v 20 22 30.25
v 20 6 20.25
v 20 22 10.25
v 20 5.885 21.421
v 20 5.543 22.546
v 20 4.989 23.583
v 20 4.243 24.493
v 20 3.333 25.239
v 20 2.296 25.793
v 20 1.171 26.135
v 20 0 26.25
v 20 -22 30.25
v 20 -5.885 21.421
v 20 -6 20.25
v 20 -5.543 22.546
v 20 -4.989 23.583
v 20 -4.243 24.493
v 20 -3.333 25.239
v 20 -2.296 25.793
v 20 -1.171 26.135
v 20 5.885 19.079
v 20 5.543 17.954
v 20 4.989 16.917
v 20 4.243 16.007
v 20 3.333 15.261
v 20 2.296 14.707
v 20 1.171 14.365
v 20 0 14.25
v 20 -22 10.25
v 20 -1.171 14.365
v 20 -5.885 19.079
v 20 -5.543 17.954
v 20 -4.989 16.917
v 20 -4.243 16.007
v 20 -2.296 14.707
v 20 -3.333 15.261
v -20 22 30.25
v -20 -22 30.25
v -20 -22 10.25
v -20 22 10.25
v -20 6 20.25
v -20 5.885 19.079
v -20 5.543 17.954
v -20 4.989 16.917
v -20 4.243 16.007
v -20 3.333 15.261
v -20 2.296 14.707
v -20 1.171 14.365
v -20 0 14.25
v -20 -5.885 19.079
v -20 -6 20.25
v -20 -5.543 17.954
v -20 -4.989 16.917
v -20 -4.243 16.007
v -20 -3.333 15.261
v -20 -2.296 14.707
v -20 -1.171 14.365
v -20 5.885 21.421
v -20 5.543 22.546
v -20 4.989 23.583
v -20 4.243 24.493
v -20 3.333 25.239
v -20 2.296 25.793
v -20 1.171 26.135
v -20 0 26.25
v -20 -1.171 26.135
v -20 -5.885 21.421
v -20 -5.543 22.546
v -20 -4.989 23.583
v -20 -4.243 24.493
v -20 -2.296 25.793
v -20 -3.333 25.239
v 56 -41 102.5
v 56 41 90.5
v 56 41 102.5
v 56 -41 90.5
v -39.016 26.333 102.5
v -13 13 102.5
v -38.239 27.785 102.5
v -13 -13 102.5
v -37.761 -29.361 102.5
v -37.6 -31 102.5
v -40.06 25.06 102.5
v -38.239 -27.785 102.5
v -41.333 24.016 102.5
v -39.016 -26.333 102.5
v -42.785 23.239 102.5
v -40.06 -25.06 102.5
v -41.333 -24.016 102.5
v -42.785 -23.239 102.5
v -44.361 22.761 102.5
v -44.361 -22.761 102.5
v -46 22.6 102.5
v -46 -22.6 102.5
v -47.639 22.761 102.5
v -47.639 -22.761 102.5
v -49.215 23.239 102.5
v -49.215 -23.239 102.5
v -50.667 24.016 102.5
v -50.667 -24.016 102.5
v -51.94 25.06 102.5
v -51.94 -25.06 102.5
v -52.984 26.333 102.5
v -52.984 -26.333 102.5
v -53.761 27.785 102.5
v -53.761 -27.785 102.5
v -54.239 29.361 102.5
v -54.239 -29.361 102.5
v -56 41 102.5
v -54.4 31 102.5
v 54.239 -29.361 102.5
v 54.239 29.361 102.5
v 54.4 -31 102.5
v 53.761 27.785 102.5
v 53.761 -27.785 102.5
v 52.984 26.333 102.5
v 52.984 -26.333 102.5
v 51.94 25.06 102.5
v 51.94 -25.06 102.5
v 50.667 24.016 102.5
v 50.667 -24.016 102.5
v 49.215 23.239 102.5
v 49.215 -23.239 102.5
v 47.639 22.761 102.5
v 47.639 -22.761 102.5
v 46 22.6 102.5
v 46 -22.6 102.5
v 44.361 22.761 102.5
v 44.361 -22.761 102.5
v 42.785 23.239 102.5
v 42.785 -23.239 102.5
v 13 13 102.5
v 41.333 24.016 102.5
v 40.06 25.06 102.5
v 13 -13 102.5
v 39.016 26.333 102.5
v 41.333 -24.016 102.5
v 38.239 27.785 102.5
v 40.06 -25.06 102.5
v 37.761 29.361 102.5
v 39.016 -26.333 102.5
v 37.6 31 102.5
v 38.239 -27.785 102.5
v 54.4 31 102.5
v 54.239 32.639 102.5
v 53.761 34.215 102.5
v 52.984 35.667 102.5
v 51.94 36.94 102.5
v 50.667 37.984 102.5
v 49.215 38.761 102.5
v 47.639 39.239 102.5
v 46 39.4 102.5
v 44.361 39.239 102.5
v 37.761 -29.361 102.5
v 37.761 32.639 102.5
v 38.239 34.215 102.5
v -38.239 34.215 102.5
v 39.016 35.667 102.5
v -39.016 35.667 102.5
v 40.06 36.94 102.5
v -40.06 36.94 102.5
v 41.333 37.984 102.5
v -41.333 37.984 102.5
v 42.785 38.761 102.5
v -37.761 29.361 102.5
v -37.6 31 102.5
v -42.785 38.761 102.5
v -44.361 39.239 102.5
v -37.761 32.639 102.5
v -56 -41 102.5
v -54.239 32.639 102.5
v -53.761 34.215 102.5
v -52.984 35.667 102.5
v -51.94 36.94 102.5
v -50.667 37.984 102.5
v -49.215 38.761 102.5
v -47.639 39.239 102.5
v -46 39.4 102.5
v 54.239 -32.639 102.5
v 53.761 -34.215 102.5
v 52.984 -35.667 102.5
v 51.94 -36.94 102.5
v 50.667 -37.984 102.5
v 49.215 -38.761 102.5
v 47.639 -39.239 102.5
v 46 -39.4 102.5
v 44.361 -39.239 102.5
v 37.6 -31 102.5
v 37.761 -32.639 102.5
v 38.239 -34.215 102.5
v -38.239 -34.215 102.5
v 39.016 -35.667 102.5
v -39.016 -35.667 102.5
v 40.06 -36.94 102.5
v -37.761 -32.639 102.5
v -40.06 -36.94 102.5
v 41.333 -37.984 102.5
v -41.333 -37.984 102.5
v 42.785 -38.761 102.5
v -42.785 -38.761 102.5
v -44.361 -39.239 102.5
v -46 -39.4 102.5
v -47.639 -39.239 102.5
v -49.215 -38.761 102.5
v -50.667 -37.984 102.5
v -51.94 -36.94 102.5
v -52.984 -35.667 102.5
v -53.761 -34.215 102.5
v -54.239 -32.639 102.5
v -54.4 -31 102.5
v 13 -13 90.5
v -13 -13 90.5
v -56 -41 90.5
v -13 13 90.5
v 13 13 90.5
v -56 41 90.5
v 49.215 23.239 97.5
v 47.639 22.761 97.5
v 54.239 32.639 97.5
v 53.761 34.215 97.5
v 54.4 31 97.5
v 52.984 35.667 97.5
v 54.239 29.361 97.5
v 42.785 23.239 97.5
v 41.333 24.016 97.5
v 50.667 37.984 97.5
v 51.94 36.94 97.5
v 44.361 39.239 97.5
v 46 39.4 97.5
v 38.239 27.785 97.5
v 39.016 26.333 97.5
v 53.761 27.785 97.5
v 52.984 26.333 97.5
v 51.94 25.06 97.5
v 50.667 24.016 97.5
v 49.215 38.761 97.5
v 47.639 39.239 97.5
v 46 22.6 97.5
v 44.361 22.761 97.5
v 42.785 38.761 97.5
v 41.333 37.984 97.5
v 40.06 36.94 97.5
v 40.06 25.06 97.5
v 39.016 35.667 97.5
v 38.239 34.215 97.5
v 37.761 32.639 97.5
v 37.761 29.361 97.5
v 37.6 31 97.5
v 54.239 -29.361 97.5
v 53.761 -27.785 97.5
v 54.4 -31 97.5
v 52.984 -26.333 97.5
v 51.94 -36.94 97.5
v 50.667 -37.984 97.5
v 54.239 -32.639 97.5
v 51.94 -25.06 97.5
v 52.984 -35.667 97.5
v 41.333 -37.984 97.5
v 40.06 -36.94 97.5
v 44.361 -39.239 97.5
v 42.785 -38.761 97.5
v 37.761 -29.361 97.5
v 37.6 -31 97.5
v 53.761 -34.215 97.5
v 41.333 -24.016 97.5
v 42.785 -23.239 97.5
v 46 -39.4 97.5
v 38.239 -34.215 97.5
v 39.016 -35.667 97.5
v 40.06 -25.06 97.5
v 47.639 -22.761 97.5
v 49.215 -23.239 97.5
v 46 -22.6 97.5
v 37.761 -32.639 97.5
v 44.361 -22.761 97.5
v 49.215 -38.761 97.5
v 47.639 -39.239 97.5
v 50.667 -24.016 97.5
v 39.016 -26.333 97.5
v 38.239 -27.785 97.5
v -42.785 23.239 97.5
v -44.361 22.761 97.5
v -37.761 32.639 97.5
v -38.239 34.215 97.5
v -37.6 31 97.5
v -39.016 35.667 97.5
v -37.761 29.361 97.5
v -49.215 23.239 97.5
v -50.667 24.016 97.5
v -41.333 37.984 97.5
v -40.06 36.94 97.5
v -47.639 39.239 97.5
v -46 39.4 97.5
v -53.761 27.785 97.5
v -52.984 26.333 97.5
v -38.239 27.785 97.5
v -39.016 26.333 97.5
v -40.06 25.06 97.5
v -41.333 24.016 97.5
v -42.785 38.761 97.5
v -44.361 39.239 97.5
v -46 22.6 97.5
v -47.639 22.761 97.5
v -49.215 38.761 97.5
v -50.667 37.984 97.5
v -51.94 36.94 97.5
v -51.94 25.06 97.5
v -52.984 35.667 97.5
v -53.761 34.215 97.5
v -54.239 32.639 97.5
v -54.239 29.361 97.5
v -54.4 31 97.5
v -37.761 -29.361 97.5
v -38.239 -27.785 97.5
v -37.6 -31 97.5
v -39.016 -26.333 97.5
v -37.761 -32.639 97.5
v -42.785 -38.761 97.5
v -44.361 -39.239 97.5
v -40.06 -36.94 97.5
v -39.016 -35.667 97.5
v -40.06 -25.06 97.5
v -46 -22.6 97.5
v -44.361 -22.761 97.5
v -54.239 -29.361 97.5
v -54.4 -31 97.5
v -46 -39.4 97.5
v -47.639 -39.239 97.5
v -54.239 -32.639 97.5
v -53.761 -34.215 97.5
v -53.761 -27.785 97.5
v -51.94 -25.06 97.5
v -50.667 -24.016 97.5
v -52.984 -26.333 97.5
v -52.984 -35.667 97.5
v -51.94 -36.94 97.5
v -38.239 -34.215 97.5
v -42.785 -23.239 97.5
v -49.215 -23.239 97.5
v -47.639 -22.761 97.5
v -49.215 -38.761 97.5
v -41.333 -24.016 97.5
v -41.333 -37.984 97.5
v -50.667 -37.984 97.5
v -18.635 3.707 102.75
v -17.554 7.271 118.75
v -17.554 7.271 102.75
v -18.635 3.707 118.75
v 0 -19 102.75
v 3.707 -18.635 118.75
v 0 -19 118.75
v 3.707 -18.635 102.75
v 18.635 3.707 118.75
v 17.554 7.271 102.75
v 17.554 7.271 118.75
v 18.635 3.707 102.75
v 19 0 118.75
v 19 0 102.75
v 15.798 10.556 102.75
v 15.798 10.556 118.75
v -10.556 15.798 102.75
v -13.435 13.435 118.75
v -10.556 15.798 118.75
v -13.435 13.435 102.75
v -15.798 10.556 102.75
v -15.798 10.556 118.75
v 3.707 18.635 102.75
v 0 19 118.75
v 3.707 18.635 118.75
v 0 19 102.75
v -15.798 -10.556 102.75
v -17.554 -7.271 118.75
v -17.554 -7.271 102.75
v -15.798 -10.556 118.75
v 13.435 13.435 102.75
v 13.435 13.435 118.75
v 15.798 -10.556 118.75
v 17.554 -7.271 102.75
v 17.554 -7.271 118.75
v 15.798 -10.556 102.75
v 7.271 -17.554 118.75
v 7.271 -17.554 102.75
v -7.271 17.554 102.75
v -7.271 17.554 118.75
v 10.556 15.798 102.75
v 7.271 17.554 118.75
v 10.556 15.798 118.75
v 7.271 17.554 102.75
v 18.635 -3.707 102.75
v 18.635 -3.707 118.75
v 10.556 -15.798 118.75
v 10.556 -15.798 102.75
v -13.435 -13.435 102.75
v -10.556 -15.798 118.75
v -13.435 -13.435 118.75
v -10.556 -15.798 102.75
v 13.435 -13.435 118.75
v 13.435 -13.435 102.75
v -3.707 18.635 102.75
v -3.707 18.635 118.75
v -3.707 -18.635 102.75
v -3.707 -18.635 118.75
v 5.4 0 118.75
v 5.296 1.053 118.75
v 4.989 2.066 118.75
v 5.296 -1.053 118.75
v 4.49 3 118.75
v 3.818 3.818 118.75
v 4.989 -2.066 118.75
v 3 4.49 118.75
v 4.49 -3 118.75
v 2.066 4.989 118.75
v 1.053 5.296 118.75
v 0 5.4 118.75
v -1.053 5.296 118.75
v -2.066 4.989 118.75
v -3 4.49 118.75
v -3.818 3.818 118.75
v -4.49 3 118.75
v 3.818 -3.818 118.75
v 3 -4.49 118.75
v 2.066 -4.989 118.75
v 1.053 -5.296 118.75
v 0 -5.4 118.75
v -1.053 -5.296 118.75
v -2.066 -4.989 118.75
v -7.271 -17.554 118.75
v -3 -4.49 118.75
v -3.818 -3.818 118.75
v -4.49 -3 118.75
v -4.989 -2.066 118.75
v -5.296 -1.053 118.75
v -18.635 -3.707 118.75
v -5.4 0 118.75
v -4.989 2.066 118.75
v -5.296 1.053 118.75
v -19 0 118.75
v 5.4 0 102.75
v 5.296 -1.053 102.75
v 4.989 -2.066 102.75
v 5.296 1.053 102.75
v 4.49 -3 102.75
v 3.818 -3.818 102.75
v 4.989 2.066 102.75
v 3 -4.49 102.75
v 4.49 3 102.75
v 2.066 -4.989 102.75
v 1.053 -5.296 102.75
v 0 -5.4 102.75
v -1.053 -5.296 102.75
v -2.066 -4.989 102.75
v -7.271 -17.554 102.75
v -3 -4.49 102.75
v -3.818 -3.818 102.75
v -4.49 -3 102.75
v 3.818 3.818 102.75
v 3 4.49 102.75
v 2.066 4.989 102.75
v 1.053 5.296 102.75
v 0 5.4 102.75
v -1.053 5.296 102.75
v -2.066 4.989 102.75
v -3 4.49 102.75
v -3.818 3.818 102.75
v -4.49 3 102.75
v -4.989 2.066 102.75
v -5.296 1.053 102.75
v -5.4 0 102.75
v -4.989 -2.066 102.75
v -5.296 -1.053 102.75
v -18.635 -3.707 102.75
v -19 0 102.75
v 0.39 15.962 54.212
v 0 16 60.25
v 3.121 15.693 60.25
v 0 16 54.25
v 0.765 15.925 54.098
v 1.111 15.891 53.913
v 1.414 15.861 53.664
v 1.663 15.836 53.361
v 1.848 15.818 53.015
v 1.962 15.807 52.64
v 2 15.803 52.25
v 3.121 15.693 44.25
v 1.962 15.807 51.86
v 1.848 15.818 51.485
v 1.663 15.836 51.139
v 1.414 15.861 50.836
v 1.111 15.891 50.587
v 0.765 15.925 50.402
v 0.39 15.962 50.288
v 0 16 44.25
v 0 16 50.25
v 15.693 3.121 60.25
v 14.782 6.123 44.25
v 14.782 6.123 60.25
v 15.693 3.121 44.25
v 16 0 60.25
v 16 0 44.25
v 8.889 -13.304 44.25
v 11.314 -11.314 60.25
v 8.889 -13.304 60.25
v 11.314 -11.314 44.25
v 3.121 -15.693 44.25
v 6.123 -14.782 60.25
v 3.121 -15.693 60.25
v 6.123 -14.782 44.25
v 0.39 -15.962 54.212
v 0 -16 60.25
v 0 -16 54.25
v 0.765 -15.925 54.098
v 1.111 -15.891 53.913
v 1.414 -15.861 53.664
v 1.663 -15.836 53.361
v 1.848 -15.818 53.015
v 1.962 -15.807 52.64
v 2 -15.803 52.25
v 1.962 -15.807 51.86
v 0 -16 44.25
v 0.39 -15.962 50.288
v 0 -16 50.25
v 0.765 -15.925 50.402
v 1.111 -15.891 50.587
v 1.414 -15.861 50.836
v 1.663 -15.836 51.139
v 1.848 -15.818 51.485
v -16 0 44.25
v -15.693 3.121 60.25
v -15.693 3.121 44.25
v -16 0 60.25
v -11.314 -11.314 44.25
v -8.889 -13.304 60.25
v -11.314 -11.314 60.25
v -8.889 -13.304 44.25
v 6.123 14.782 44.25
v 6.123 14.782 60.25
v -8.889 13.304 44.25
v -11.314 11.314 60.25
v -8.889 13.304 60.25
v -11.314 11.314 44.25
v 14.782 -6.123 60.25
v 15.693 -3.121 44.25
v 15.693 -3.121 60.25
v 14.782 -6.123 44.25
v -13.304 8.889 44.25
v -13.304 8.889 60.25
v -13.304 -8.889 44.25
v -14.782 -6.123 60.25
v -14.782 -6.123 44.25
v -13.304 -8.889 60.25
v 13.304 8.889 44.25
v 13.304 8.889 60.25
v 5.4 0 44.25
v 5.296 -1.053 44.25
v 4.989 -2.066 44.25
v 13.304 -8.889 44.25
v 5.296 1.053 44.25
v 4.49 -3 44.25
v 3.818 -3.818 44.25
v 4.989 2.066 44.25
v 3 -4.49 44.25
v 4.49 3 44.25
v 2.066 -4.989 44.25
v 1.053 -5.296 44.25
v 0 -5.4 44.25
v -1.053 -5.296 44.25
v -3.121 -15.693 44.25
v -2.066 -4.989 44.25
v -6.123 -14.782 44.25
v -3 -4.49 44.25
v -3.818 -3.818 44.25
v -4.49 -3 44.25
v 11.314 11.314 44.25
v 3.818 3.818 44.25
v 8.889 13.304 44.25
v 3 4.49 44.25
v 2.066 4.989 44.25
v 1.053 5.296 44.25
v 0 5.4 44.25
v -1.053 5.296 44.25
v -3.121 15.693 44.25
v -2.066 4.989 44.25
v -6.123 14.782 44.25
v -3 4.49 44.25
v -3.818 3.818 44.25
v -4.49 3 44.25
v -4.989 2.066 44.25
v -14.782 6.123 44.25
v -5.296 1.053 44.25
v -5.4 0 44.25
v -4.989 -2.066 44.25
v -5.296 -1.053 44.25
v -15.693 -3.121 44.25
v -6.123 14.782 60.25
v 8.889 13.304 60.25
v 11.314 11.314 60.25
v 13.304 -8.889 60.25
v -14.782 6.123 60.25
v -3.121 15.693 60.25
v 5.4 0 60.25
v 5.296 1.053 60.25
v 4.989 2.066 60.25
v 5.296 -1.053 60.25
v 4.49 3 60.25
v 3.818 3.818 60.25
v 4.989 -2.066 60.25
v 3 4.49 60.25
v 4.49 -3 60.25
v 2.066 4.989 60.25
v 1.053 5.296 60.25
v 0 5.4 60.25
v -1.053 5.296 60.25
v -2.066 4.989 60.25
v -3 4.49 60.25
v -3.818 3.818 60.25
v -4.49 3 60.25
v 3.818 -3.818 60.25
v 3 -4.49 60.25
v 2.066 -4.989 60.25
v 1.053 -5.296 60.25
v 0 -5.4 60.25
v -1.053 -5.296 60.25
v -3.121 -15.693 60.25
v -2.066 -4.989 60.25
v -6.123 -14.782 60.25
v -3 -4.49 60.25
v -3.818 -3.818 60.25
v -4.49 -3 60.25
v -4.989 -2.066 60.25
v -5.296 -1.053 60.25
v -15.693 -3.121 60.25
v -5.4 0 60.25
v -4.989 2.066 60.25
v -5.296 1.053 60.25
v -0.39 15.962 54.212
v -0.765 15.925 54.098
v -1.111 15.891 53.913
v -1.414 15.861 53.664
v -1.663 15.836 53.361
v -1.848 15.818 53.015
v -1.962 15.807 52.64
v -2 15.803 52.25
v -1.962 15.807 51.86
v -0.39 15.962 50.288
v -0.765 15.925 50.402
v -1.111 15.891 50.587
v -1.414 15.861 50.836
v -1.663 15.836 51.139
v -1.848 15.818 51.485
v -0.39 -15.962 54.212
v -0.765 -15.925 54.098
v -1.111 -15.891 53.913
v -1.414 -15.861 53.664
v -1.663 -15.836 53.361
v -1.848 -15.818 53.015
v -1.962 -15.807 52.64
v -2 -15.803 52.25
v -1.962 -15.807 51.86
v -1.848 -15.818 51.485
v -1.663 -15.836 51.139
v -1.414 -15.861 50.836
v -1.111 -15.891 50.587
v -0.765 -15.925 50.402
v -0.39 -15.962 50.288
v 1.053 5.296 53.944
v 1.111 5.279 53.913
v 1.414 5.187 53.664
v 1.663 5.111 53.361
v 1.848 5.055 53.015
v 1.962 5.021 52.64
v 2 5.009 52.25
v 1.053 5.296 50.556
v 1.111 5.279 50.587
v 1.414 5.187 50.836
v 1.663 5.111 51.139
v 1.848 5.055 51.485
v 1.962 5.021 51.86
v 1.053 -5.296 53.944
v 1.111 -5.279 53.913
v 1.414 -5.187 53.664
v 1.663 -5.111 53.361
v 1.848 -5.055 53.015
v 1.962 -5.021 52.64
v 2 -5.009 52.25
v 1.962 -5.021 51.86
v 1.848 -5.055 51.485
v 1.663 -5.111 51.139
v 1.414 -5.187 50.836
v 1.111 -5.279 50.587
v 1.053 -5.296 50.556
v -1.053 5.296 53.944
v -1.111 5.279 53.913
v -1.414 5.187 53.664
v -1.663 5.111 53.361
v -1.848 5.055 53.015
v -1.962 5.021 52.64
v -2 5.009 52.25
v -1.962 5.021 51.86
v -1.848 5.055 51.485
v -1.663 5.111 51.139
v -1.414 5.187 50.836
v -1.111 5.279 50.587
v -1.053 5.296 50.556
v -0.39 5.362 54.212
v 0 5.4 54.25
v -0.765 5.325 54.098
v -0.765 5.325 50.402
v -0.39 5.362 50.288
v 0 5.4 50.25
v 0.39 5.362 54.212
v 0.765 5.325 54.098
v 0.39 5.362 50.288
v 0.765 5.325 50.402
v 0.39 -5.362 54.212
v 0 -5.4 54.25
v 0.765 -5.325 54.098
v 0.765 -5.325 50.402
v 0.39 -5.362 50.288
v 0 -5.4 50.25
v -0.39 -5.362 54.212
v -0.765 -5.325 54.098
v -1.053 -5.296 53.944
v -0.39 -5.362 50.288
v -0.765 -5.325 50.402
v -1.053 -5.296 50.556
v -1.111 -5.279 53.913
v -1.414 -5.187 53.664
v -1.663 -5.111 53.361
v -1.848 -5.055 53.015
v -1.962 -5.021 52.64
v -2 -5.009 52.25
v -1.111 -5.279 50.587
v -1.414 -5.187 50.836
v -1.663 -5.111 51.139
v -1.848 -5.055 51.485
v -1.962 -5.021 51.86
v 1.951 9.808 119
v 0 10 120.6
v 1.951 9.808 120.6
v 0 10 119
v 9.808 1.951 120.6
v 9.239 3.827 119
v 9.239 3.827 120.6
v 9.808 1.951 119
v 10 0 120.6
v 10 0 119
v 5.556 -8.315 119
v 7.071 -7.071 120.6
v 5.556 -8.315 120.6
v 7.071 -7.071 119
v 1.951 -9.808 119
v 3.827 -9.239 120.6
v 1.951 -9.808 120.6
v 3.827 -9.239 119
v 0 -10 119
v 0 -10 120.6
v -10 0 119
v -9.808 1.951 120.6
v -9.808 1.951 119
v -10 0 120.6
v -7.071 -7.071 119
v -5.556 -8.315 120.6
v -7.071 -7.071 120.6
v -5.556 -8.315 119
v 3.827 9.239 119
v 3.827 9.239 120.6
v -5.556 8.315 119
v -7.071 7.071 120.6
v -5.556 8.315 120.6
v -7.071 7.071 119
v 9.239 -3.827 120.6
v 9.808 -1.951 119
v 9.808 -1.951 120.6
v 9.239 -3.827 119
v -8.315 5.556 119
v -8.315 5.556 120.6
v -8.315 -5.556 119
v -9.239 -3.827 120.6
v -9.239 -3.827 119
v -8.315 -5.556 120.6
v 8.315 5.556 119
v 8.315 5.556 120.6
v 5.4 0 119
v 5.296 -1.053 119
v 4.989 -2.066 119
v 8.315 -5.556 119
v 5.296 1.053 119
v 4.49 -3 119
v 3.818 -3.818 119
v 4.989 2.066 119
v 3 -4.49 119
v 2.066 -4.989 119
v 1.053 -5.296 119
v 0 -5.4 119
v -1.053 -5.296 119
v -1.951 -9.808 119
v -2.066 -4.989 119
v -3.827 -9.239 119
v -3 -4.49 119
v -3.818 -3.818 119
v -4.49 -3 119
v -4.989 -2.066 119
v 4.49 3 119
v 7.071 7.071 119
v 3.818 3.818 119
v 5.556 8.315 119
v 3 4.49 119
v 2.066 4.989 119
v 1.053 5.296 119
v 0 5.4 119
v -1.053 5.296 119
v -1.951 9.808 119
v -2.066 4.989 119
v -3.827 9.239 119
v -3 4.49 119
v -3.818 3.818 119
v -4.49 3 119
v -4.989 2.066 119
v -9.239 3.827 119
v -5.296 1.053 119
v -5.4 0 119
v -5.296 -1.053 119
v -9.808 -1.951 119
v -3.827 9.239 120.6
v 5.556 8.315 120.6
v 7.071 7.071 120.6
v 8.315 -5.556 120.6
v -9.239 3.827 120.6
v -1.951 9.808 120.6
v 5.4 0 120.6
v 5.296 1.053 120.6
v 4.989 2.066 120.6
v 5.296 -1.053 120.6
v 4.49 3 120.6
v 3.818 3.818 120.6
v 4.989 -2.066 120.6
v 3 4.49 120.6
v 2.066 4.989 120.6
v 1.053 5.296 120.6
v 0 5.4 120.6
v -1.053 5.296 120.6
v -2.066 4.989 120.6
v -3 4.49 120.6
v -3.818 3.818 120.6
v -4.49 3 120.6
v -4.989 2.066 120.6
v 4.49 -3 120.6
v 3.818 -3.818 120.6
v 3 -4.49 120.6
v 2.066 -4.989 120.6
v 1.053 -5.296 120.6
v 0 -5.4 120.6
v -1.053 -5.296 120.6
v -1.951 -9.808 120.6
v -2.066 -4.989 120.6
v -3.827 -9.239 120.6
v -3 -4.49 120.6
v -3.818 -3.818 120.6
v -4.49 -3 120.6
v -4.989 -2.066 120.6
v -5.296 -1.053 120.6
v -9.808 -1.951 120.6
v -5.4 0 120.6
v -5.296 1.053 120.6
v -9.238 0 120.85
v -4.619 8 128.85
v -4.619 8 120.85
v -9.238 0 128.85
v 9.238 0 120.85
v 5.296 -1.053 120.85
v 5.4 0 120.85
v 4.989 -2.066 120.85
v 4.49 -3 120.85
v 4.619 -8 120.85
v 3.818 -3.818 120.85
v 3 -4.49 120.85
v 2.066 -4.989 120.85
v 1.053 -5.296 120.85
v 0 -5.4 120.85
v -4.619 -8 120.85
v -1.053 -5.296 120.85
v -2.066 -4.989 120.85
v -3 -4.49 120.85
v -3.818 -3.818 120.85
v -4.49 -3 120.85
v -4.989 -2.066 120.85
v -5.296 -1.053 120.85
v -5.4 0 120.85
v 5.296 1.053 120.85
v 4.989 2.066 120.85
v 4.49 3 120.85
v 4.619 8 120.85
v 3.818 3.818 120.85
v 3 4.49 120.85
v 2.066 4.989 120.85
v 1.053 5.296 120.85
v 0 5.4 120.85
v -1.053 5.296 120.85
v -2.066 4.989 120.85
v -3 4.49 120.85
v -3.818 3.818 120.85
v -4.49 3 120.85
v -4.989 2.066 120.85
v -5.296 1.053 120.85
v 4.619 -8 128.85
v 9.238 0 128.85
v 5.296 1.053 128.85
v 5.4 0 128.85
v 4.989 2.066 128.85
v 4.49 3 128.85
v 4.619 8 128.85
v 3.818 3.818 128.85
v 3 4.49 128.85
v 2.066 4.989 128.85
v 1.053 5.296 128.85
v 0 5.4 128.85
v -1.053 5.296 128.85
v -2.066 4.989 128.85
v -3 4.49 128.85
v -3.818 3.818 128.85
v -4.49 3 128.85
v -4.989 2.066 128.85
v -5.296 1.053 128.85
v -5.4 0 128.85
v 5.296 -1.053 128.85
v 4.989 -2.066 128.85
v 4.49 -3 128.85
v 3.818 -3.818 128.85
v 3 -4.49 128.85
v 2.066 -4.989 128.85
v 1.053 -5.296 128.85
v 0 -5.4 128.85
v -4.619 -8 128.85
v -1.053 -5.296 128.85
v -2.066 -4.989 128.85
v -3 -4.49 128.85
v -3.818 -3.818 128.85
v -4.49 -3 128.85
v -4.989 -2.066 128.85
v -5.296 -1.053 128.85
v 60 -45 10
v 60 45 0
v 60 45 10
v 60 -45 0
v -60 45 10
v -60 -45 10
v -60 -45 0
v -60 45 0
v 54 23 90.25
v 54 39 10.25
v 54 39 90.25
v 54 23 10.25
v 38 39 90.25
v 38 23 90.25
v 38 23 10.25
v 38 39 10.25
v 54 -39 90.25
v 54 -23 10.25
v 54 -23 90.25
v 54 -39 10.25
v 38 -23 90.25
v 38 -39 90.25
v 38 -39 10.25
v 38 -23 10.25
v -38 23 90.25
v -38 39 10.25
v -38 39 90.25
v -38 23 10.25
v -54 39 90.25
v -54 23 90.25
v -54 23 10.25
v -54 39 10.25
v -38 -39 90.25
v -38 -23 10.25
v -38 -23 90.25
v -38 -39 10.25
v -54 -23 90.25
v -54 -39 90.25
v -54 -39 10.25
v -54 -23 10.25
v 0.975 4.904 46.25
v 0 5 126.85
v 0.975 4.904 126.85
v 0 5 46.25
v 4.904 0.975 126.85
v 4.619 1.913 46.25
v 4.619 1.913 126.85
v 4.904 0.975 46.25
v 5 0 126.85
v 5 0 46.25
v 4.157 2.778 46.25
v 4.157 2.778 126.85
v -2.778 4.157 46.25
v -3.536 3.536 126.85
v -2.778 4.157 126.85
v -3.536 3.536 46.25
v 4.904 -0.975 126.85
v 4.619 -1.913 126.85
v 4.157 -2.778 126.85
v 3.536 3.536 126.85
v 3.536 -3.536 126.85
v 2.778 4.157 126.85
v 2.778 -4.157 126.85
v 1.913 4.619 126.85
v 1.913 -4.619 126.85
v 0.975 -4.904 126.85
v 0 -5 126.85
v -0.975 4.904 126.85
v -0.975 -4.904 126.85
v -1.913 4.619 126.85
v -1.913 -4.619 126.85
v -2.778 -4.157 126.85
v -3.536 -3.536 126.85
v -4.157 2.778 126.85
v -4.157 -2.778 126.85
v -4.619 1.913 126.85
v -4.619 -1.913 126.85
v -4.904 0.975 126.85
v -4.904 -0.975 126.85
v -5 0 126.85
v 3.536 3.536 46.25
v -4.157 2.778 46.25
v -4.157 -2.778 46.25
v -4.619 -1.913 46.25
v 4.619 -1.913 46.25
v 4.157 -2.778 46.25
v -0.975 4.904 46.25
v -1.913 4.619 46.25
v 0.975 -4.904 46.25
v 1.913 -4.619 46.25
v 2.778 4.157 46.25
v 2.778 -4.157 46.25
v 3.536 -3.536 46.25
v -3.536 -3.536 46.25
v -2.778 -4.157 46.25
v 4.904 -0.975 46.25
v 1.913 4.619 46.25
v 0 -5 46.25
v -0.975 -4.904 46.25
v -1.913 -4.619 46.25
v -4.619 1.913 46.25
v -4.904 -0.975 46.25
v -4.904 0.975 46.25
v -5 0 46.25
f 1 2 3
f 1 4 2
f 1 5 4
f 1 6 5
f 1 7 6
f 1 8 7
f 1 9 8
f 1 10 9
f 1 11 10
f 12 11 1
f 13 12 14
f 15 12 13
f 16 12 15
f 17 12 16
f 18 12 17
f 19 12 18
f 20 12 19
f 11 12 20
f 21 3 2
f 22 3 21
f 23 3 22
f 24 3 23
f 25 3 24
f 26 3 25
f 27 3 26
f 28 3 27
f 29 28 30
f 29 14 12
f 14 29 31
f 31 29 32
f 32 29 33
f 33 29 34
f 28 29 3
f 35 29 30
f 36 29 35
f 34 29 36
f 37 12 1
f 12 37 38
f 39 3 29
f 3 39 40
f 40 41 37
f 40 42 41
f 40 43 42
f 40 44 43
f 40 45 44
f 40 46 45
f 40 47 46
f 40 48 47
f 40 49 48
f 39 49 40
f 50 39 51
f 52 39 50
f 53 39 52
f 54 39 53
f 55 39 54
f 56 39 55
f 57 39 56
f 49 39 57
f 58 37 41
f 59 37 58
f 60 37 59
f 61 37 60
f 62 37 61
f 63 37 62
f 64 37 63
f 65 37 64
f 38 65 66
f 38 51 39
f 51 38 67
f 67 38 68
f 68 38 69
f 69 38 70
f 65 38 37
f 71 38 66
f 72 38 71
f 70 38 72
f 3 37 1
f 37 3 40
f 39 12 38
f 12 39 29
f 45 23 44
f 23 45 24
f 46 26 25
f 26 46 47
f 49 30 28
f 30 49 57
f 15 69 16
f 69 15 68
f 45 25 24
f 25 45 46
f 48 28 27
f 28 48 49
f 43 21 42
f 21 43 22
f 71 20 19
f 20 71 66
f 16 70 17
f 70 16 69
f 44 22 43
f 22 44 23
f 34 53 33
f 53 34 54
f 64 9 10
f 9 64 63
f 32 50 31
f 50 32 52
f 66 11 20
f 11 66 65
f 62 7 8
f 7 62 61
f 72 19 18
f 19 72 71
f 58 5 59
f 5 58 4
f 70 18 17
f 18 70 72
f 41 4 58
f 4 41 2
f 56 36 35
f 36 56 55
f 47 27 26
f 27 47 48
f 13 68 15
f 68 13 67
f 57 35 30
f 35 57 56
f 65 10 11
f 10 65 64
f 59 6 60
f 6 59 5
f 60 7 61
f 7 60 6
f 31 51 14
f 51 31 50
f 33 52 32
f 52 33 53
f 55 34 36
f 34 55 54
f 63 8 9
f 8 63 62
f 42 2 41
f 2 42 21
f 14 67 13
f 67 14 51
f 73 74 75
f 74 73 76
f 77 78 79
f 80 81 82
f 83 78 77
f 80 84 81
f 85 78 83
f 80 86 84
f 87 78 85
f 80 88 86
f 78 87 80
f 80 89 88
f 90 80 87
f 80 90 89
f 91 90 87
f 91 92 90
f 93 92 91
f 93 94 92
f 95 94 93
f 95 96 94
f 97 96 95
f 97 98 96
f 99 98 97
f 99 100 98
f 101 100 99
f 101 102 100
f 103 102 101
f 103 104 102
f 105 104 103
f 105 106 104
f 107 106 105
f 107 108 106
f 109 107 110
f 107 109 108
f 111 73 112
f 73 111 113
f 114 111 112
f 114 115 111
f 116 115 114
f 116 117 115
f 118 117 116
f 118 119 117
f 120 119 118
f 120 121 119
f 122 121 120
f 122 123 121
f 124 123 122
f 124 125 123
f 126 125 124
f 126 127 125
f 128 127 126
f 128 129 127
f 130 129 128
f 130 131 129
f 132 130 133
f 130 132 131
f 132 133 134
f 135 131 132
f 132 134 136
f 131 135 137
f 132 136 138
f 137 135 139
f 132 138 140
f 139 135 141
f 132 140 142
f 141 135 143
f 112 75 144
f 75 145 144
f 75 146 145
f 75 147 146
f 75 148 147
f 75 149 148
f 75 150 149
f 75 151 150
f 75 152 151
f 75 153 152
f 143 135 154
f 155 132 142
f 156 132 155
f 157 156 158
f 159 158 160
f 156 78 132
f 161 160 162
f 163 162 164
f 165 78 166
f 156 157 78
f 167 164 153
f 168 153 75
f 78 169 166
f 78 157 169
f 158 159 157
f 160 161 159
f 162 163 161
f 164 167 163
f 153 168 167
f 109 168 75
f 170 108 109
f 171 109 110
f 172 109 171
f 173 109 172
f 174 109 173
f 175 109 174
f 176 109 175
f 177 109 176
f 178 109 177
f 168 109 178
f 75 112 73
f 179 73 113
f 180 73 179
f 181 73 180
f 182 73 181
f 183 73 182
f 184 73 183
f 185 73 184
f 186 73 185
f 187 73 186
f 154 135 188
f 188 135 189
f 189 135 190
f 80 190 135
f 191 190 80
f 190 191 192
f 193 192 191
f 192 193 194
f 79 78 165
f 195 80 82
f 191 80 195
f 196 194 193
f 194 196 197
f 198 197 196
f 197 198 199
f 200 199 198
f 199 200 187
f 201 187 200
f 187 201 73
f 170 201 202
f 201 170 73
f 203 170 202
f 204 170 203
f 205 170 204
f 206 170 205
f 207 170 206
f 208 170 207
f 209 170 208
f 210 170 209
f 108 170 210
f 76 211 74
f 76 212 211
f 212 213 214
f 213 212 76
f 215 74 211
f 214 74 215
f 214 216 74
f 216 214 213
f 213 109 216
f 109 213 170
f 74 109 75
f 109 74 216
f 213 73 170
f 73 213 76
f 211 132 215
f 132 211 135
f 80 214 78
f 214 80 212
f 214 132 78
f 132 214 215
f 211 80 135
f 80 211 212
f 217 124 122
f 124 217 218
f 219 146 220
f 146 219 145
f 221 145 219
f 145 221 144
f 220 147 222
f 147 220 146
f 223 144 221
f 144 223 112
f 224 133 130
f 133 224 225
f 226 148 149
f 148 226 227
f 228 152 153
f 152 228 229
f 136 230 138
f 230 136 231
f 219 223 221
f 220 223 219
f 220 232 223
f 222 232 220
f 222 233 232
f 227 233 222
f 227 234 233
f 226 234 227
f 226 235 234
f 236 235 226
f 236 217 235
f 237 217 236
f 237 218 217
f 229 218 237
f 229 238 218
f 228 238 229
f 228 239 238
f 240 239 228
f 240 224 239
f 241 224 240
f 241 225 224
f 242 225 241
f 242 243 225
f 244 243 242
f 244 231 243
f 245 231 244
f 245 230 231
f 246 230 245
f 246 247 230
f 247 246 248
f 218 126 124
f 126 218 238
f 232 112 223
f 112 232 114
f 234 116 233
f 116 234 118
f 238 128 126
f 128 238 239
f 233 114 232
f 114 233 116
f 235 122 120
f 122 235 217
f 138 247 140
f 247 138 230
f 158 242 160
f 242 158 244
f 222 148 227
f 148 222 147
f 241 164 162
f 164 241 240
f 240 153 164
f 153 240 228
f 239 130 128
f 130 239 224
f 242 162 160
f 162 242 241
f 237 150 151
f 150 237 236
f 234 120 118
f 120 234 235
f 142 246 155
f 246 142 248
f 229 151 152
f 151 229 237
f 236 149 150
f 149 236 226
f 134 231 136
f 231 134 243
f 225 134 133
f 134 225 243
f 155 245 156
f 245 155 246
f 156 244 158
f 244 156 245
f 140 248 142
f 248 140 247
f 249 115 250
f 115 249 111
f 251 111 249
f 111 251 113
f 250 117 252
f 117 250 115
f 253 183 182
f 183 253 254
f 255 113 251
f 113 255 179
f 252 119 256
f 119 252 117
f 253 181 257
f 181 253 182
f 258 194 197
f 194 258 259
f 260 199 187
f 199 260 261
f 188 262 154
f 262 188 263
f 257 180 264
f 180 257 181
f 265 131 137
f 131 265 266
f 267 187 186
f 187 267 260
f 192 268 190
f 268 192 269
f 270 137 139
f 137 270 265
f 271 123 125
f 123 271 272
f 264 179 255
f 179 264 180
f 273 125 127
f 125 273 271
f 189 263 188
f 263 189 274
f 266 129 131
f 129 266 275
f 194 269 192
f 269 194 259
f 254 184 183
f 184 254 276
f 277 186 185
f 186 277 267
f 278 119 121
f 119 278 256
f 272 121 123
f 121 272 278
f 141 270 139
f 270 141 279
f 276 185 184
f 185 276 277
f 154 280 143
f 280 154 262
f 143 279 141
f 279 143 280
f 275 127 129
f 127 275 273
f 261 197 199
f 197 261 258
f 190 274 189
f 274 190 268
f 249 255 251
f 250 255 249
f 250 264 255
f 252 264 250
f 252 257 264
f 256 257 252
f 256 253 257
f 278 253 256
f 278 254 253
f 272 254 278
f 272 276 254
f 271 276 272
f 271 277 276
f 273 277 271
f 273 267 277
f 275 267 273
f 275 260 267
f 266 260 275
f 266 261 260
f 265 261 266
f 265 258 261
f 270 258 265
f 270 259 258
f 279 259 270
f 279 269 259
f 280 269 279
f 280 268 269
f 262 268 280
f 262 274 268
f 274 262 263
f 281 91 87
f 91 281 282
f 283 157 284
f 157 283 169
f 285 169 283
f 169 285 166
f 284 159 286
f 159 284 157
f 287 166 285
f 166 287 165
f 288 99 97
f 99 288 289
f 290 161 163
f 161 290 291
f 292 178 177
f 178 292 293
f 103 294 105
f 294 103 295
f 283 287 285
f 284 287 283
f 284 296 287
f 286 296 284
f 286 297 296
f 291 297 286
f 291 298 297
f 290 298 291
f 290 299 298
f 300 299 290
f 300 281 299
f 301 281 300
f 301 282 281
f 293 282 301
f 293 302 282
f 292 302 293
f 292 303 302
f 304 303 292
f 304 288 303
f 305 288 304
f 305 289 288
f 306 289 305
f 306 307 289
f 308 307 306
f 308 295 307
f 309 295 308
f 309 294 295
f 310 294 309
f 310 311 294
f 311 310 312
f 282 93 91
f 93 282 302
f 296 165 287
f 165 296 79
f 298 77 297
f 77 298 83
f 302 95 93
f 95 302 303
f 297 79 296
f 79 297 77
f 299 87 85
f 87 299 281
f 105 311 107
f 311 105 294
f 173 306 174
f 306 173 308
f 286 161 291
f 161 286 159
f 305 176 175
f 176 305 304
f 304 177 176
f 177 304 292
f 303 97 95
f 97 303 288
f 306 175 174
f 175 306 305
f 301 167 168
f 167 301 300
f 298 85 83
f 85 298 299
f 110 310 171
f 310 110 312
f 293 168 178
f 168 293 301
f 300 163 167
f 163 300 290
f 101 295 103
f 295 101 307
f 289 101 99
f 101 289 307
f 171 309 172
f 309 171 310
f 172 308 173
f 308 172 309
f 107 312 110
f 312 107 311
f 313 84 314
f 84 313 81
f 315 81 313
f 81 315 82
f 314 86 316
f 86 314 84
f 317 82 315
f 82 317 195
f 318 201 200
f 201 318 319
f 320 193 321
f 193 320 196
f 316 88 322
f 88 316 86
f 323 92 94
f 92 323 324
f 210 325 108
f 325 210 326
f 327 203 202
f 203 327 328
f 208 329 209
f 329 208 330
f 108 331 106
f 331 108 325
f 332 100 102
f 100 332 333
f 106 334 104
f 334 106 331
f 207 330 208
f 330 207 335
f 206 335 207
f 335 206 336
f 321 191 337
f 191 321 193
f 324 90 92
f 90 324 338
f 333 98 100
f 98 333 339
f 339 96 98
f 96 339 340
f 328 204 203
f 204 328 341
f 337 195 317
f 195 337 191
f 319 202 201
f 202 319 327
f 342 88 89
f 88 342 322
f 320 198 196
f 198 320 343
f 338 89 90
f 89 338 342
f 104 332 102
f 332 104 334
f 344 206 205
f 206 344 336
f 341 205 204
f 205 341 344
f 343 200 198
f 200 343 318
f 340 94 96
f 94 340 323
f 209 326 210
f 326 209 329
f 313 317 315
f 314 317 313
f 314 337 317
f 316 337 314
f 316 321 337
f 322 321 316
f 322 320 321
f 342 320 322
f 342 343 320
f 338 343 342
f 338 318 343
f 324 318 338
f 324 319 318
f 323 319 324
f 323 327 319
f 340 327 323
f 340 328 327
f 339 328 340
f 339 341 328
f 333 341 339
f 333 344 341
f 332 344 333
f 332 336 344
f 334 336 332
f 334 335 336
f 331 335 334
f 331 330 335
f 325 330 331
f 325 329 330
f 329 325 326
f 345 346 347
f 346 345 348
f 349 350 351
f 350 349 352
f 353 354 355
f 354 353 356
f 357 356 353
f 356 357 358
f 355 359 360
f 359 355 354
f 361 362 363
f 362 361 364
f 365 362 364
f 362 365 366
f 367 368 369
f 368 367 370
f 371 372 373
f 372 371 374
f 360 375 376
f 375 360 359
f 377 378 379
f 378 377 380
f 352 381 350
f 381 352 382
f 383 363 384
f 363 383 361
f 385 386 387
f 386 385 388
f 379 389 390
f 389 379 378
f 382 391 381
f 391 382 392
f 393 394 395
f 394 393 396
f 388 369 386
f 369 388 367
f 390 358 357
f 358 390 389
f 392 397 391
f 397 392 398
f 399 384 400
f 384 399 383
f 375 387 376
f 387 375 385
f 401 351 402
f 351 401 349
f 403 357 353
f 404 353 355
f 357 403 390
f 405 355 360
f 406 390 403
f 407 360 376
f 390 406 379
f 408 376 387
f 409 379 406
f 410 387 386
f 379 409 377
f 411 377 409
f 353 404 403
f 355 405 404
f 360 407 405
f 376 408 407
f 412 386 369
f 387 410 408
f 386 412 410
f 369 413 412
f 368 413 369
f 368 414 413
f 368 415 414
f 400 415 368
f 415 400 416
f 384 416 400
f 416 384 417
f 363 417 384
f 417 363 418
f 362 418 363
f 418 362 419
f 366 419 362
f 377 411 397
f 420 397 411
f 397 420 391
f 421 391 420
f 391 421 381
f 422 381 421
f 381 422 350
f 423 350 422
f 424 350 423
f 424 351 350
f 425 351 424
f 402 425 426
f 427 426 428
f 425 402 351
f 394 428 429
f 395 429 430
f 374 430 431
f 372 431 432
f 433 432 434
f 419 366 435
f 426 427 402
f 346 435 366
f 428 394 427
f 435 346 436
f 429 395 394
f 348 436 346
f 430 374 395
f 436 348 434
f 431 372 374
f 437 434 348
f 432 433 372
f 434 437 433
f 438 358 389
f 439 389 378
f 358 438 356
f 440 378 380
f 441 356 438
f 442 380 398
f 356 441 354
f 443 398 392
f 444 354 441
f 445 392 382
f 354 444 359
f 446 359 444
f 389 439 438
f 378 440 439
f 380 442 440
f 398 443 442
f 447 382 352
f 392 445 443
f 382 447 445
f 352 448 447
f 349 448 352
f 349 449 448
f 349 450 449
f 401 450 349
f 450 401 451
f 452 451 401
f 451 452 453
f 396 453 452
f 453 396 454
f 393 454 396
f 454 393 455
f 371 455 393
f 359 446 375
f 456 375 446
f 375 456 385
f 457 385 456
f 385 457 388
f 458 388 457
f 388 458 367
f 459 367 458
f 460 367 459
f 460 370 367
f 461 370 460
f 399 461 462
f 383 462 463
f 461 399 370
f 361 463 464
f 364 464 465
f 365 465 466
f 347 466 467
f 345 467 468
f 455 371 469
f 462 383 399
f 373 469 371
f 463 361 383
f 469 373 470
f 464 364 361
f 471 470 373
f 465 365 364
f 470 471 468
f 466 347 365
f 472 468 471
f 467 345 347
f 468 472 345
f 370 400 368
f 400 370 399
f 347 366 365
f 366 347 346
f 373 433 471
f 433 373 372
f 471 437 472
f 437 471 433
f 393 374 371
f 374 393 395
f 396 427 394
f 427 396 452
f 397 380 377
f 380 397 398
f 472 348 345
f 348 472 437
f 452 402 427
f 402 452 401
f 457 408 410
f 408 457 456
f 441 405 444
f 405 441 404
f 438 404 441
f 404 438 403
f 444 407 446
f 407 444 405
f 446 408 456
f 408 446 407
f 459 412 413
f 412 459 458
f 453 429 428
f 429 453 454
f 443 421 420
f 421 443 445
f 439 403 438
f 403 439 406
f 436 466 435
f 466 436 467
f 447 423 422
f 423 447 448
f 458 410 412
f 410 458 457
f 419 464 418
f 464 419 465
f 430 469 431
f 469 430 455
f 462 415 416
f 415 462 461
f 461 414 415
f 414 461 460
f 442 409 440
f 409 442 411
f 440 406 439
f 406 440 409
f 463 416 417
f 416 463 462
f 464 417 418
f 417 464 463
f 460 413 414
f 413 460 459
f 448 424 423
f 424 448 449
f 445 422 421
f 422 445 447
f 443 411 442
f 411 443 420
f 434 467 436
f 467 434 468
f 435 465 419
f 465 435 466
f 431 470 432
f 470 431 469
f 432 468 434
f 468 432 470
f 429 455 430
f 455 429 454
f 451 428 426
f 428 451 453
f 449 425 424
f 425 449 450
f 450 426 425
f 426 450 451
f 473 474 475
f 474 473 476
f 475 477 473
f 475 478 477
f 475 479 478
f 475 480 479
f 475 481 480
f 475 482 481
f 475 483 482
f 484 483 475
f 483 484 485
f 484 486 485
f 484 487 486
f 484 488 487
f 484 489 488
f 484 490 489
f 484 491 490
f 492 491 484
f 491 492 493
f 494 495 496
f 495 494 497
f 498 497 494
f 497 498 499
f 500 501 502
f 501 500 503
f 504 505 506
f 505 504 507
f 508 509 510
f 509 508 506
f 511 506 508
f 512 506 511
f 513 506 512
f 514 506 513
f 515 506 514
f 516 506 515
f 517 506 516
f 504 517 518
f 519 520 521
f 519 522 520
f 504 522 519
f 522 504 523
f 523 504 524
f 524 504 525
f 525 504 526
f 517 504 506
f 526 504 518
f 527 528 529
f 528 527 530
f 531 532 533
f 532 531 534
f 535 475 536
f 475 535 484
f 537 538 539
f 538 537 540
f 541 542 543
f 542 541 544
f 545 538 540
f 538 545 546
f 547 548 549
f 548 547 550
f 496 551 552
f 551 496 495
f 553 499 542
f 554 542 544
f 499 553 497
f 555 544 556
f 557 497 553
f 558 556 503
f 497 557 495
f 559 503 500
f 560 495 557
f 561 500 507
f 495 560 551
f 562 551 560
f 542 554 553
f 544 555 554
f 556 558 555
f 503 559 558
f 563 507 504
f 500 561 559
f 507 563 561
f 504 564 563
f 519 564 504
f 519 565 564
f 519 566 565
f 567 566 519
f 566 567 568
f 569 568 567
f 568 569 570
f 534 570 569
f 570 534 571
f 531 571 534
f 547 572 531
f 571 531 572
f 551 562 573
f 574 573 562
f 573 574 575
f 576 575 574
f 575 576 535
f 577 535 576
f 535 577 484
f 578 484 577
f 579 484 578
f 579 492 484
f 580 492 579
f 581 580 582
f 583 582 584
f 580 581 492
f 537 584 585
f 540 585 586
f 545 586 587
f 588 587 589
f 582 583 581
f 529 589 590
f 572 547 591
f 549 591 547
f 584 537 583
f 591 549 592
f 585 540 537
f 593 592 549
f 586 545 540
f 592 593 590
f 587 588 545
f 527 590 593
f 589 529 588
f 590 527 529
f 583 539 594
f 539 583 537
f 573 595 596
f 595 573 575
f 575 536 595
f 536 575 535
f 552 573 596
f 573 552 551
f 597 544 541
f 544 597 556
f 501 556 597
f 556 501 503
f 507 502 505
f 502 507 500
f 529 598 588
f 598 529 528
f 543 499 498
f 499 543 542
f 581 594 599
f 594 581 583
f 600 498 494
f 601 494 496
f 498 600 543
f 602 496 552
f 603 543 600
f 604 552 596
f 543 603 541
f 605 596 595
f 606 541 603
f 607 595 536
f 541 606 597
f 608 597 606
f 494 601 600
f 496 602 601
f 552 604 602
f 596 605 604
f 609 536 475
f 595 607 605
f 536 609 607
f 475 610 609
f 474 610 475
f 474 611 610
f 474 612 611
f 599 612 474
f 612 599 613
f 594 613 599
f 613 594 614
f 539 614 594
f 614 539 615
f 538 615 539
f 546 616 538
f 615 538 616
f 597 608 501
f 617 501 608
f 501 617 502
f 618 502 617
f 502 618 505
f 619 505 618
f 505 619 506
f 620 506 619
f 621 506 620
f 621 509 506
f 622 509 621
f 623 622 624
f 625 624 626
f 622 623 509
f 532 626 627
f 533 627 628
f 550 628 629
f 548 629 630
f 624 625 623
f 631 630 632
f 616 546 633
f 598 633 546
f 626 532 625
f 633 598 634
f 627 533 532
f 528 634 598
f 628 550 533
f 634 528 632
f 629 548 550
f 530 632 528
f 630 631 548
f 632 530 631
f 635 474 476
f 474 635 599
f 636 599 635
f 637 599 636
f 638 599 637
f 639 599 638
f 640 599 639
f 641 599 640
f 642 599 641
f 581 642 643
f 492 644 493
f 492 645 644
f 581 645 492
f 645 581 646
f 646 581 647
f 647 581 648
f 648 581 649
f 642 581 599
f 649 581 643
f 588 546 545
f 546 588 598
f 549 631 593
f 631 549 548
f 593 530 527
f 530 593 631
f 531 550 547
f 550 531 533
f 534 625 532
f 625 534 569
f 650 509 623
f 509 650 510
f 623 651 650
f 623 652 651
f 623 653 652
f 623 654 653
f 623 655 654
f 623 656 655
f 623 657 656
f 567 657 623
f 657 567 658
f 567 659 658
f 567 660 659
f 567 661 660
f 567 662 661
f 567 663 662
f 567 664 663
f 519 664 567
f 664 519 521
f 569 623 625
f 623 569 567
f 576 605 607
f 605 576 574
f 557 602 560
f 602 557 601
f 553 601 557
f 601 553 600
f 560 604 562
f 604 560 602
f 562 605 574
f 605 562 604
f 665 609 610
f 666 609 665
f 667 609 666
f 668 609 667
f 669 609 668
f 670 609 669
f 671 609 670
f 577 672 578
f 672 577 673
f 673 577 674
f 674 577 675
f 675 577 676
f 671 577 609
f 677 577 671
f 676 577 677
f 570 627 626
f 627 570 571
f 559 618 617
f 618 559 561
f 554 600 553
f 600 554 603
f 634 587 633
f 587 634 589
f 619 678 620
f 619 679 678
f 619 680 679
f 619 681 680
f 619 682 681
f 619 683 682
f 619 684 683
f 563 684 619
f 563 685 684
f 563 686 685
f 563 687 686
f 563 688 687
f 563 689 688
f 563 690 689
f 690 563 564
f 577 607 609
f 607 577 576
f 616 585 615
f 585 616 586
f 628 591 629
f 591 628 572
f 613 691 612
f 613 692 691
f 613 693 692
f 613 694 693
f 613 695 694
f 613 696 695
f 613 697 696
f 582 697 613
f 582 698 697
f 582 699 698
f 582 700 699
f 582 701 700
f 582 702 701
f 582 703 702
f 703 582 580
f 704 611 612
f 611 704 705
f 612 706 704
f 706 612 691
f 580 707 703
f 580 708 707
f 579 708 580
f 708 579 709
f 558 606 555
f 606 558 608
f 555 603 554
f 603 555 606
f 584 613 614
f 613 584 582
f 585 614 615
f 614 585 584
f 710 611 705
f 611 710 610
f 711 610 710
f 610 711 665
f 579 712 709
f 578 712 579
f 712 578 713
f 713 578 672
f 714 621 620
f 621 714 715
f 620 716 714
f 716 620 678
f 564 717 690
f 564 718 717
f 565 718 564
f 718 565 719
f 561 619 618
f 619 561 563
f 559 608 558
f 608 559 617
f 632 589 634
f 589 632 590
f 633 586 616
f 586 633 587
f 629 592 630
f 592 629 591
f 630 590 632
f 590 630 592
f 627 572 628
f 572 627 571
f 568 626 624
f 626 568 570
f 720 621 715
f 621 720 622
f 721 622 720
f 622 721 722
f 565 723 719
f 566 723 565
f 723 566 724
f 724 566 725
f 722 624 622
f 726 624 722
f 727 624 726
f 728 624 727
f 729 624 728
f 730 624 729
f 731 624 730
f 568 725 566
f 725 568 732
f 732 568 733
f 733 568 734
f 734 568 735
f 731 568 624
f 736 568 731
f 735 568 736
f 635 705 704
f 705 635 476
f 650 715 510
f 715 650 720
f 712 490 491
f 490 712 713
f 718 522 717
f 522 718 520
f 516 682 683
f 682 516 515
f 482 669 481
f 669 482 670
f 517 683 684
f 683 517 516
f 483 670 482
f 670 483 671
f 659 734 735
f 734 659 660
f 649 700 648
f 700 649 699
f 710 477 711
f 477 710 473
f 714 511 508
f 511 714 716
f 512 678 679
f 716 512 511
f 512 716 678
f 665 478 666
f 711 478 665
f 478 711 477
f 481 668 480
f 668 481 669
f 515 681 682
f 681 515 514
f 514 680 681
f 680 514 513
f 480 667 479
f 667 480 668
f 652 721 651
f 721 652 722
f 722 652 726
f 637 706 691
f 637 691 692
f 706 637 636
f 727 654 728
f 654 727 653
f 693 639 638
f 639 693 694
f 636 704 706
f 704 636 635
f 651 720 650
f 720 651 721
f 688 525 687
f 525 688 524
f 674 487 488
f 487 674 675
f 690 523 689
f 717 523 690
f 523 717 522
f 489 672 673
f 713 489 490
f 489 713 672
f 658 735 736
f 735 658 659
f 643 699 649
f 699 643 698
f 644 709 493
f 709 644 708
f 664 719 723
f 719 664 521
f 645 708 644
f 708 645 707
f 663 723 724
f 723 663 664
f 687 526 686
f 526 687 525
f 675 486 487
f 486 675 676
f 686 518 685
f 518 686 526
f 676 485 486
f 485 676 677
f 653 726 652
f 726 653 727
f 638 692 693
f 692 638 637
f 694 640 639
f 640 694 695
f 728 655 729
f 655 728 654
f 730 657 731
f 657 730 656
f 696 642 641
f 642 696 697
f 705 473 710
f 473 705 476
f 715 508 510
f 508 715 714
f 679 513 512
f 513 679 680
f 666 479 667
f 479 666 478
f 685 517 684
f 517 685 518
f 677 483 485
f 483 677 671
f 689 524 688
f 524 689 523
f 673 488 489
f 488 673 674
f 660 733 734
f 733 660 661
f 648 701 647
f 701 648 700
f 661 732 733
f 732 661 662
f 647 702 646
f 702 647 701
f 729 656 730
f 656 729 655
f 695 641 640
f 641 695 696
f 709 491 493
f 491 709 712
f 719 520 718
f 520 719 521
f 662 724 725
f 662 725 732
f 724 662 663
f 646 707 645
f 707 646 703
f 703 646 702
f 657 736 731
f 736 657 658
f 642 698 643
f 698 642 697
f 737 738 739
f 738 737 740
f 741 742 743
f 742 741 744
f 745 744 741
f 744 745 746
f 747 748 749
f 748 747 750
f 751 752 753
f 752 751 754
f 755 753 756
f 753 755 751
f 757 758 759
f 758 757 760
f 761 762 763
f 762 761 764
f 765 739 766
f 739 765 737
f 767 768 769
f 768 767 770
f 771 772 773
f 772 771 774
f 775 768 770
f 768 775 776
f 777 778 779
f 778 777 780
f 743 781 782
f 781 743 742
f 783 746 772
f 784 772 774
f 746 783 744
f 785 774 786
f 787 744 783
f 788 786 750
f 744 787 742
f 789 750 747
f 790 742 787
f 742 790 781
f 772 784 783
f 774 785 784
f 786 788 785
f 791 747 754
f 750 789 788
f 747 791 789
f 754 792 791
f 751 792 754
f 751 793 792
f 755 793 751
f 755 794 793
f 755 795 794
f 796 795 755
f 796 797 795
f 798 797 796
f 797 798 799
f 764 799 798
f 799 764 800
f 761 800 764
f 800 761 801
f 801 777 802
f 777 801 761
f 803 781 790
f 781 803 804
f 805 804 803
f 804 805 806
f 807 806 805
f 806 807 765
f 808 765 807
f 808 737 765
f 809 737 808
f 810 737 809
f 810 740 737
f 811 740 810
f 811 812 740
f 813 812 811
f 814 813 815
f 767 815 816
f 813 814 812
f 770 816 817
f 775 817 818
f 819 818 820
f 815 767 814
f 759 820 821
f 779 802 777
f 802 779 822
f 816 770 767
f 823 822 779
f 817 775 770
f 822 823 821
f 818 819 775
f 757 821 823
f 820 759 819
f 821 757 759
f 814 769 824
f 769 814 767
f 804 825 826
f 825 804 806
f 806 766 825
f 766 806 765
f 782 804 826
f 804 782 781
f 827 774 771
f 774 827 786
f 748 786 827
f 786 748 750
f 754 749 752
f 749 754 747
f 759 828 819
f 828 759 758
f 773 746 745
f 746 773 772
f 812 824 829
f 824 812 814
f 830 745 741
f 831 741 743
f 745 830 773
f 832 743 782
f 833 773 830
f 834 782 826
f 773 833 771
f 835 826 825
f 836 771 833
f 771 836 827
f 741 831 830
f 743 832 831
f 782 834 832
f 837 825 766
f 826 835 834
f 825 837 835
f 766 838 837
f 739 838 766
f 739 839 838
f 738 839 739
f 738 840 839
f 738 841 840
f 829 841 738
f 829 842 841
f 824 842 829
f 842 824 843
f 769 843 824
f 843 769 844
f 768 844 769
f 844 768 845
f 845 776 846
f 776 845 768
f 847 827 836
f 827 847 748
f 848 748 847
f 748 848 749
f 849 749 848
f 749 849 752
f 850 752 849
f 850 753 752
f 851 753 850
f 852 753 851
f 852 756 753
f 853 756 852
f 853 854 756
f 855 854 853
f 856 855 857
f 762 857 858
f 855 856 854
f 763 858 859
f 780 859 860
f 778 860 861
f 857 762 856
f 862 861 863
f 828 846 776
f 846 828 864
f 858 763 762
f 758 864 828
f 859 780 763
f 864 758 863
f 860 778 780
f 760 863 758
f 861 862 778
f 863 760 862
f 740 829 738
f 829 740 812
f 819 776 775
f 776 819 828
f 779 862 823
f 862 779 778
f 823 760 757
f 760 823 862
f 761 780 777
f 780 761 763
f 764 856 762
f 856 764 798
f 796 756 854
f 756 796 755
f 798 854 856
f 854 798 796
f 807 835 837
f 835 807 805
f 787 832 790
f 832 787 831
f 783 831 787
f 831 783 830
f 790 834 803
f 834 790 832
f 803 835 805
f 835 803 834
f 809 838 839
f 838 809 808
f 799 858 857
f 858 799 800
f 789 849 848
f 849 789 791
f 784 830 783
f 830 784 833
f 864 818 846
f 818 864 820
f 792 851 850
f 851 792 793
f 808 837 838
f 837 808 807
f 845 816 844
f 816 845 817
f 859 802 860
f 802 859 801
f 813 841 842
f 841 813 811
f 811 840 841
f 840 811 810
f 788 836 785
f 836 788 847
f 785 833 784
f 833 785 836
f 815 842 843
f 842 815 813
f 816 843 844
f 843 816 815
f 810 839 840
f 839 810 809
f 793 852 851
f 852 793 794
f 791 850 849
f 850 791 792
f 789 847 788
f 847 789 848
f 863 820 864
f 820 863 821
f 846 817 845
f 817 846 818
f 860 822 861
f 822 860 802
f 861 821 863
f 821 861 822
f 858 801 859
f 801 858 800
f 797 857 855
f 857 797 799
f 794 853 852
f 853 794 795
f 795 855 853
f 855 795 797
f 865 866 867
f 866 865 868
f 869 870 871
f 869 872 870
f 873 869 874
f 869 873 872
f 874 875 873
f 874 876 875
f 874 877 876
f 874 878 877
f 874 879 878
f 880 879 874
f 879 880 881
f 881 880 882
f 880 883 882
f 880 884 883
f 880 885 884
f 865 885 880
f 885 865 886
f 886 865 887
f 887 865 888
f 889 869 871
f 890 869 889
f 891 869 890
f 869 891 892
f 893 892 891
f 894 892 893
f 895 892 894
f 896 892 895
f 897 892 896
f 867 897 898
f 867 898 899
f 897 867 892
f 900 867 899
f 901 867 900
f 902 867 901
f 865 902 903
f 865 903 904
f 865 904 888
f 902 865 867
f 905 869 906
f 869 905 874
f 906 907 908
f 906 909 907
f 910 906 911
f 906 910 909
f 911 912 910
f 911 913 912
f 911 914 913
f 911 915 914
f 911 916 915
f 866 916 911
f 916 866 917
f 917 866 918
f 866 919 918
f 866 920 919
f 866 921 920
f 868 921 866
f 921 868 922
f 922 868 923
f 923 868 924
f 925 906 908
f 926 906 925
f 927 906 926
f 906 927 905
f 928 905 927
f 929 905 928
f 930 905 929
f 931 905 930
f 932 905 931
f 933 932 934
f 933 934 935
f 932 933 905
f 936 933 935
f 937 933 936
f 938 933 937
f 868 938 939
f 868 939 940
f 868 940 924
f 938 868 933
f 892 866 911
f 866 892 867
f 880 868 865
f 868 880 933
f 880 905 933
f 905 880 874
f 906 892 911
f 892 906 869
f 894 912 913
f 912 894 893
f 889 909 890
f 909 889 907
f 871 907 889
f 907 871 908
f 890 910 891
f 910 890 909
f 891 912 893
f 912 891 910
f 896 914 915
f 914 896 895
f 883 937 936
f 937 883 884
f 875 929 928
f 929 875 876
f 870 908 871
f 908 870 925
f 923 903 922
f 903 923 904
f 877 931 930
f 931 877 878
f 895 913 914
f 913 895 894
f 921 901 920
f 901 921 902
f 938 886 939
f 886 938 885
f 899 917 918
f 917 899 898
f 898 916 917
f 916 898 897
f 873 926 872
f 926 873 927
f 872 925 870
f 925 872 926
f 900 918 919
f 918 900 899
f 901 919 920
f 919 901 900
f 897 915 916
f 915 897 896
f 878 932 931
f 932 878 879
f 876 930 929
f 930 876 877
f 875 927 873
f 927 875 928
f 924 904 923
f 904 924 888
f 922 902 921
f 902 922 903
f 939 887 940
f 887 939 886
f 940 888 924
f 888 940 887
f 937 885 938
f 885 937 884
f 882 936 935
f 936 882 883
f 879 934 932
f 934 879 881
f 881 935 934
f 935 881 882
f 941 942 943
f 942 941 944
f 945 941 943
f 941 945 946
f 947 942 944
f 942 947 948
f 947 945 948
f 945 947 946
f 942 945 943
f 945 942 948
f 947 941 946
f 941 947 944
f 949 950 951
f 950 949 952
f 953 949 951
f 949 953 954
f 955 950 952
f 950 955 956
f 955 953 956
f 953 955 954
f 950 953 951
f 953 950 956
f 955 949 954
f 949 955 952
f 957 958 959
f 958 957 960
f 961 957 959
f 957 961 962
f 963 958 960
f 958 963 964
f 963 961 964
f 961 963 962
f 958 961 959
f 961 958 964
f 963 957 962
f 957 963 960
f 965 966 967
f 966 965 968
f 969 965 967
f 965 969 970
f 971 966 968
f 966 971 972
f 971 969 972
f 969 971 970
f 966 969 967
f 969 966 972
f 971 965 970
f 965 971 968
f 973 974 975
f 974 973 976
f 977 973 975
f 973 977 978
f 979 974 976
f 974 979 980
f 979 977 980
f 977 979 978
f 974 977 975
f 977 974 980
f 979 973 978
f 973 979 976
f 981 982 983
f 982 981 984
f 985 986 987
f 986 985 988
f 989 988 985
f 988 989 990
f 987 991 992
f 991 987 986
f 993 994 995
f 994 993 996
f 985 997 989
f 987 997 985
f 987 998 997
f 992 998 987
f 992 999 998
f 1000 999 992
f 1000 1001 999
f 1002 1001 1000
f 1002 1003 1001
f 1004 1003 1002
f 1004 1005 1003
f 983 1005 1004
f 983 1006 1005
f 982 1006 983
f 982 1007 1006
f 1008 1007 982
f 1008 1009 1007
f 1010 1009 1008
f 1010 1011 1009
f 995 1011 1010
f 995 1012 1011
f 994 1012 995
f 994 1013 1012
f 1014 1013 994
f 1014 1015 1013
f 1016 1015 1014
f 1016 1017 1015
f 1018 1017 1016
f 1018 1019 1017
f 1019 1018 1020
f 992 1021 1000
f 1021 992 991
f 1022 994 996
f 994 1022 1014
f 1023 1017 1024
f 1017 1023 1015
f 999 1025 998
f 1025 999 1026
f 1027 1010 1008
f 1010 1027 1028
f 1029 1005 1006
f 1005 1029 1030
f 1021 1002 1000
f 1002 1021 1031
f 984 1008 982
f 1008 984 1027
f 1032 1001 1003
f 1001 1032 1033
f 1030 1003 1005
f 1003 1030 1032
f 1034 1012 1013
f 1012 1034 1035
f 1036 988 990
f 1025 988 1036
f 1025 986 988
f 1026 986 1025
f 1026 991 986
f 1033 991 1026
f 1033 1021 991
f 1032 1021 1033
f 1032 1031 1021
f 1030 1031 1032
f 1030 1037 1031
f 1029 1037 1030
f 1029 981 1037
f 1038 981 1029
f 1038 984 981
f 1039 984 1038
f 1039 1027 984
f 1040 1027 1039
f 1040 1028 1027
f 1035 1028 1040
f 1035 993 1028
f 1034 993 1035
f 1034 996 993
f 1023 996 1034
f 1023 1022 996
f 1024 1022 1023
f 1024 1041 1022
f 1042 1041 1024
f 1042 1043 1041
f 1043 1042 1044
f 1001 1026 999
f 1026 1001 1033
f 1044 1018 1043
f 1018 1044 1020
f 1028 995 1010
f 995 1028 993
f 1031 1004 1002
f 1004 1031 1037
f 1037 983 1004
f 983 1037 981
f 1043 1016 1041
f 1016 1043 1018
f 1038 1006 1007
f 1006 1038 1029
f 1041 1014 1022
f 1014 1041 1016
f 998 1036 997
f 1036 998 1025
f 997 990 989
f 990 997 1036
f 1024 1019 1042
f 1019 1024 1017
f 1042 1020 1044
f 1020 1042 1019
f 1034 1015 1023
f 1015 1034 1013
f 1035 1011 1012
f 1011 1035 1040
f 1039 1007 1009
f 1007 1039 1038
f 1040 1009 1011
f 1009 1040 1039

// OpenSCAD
$fn = 32;

// ------------------------------------------------------------------------
// Arbor press fixture: screw d10, posts 80 mm, gap 14 mm
// Every part is its own module, assembly() places every instance.
// ------------------------------------------------------------------------

// --- part 1 ---
module press_bed() {
  difference() {
    translate([-60, -45, 0]) cube([120, 90, 10]);
  }
}

// --- part 2 ---
module anvil_block() {
  difference() {
    translate([-20, -22, 0]) cube([40, 44, 20]);
    translate([0, 0, 10]) rotate([0, 90, 0]) cylinder(h = 42, d = 12, center = true);
  }
}

// --- part 3 ---
module press_post_a() {
  translate([-8, -8, 0]) cube([16, 16, 80]);
}

// --- part 4 ---
module press_post_b() {
  translate([-8, -8, 0]) cube([16, 16, 80]);
}

// --- part 5 ---
module press_post_c() {
  translate([-8, -8, 0]) cube([16, 16, 80]);
}

// --- part 6 ---
module press_post_d() {
  translate([-8, -8, 0]) cube([16, 16, 80]);
}

// --- part 7 ---
module press_frame() {
  difference() {
    translate([-56, -41, 0]) cube([112, 82, 12]);
    translate([-13, -13, -1]) cube([26, 26, 14]);
    translate([46, 31, 7]) cylinder(h = 6, d = 16.8);
    translate([46, -31, 7]) cylinder(h = 6, d = 16.8);
    translate([-46, 31, 7]) cylinder(h = 6, d = 16.8);
    translate([-46, -31, 7]) cylinder(h = 6, d = 16.8);
  }
}

// --- part 8 ---
module guide_ring() {
  difference() {
      translate([0, 0, 0]) cylinder(h = 16, d = 38);
      translate([0, 0, -1]) cylinder(h = 18, d = 10.8);
    }
}

// --- part 9 ---
module press_screw() {
  translate([0, 0, -40.3]) cylinder(h = 80.6, d = 10);
}

// --- part 10 ---
module press_head() {
  difference() {
    cylinder(h = 16, d = 32);
    translate([0, 0, -1]) cylinder(h = 18, d = 10.8);
    translate([0, 0, 8]) rotate([90, 0, 0]) cylinder(h = 34, d = 4, center = true);
  }
}

// --- part 11 ---
module nut_washer() {
  difference() {
      translate([0, 0, 0]) cylinder(h = 1.6, d = 20);
      translate([0, 0, -1]) cylinder(h = 3.6, d = 10.8);
    }
}

// --- part 12 ---
module press_nut() {
  difference() {
    linear_extrude(height = 8) polygon(points = [[9.238, 0], [4.619, 8], [-4.619, 8], [-9.238, 0], [-4.619, -8], [4.619, -8]]);
    translate([0, 0, -1]) cylinder(h = 10, d = 10.8);
  }
}

// --- assembly ---
module assembly() {
  color([0.80, 0.24, 0.20]) translate([0, 0, 0]) rotate([0, 0, 0]) press_bed();
  color([0.20, 0.45, 0.75]) translate([0, 0, 10.25]) rotate([0, 0, 0]) anvil_block();
  color([0.25, 0.62, 0.32]) translate([46, 31, 10.25]) rotate([0, 0, 0]) press_post_a();
  color([0.92, 0.70, 0.18]) translate([46, -31, 10.25]) rotate([0, 0, 0]) press_post_b();
  color([0.58, 0.35, 0.70]) translate([-46, 31, 10.25]) rotate([0, 0, 0]) press_post_c();
  color([0.16, 0.66, 0.66]) translate([-46, -31, 10.25]) rotate([0, 0, 0]) press_post_d();
  color([0.85, 0.48, 0.18]) translate([0, 0, 90.5]) rotate([0, 0, 0]) press_frame();
  color([0.55, 0.60, 0.65]) translate([0, 0, 102.75]) rotate([0, 0, 0]) guide_ring();
  color([0.75, 0.30, 0.55]) translate([0, 0, 86.55]) rotate([0, 0, 0]) press_screw();
  color([0.42, 0.52, 0.28]) translate([0, 0, 44.25]) rotate([0, 0, 0]) press_head();
  color([0.80, 0.24, 0.20]) translate([0, 0, 119]) rotate([0, 0, 0]) nut_washer();
  color([0.20, 0.45, 0.75]) translate([0, 0, 120.85]) rotate([0, 0, 0]) press_nut();
}

assembly();
